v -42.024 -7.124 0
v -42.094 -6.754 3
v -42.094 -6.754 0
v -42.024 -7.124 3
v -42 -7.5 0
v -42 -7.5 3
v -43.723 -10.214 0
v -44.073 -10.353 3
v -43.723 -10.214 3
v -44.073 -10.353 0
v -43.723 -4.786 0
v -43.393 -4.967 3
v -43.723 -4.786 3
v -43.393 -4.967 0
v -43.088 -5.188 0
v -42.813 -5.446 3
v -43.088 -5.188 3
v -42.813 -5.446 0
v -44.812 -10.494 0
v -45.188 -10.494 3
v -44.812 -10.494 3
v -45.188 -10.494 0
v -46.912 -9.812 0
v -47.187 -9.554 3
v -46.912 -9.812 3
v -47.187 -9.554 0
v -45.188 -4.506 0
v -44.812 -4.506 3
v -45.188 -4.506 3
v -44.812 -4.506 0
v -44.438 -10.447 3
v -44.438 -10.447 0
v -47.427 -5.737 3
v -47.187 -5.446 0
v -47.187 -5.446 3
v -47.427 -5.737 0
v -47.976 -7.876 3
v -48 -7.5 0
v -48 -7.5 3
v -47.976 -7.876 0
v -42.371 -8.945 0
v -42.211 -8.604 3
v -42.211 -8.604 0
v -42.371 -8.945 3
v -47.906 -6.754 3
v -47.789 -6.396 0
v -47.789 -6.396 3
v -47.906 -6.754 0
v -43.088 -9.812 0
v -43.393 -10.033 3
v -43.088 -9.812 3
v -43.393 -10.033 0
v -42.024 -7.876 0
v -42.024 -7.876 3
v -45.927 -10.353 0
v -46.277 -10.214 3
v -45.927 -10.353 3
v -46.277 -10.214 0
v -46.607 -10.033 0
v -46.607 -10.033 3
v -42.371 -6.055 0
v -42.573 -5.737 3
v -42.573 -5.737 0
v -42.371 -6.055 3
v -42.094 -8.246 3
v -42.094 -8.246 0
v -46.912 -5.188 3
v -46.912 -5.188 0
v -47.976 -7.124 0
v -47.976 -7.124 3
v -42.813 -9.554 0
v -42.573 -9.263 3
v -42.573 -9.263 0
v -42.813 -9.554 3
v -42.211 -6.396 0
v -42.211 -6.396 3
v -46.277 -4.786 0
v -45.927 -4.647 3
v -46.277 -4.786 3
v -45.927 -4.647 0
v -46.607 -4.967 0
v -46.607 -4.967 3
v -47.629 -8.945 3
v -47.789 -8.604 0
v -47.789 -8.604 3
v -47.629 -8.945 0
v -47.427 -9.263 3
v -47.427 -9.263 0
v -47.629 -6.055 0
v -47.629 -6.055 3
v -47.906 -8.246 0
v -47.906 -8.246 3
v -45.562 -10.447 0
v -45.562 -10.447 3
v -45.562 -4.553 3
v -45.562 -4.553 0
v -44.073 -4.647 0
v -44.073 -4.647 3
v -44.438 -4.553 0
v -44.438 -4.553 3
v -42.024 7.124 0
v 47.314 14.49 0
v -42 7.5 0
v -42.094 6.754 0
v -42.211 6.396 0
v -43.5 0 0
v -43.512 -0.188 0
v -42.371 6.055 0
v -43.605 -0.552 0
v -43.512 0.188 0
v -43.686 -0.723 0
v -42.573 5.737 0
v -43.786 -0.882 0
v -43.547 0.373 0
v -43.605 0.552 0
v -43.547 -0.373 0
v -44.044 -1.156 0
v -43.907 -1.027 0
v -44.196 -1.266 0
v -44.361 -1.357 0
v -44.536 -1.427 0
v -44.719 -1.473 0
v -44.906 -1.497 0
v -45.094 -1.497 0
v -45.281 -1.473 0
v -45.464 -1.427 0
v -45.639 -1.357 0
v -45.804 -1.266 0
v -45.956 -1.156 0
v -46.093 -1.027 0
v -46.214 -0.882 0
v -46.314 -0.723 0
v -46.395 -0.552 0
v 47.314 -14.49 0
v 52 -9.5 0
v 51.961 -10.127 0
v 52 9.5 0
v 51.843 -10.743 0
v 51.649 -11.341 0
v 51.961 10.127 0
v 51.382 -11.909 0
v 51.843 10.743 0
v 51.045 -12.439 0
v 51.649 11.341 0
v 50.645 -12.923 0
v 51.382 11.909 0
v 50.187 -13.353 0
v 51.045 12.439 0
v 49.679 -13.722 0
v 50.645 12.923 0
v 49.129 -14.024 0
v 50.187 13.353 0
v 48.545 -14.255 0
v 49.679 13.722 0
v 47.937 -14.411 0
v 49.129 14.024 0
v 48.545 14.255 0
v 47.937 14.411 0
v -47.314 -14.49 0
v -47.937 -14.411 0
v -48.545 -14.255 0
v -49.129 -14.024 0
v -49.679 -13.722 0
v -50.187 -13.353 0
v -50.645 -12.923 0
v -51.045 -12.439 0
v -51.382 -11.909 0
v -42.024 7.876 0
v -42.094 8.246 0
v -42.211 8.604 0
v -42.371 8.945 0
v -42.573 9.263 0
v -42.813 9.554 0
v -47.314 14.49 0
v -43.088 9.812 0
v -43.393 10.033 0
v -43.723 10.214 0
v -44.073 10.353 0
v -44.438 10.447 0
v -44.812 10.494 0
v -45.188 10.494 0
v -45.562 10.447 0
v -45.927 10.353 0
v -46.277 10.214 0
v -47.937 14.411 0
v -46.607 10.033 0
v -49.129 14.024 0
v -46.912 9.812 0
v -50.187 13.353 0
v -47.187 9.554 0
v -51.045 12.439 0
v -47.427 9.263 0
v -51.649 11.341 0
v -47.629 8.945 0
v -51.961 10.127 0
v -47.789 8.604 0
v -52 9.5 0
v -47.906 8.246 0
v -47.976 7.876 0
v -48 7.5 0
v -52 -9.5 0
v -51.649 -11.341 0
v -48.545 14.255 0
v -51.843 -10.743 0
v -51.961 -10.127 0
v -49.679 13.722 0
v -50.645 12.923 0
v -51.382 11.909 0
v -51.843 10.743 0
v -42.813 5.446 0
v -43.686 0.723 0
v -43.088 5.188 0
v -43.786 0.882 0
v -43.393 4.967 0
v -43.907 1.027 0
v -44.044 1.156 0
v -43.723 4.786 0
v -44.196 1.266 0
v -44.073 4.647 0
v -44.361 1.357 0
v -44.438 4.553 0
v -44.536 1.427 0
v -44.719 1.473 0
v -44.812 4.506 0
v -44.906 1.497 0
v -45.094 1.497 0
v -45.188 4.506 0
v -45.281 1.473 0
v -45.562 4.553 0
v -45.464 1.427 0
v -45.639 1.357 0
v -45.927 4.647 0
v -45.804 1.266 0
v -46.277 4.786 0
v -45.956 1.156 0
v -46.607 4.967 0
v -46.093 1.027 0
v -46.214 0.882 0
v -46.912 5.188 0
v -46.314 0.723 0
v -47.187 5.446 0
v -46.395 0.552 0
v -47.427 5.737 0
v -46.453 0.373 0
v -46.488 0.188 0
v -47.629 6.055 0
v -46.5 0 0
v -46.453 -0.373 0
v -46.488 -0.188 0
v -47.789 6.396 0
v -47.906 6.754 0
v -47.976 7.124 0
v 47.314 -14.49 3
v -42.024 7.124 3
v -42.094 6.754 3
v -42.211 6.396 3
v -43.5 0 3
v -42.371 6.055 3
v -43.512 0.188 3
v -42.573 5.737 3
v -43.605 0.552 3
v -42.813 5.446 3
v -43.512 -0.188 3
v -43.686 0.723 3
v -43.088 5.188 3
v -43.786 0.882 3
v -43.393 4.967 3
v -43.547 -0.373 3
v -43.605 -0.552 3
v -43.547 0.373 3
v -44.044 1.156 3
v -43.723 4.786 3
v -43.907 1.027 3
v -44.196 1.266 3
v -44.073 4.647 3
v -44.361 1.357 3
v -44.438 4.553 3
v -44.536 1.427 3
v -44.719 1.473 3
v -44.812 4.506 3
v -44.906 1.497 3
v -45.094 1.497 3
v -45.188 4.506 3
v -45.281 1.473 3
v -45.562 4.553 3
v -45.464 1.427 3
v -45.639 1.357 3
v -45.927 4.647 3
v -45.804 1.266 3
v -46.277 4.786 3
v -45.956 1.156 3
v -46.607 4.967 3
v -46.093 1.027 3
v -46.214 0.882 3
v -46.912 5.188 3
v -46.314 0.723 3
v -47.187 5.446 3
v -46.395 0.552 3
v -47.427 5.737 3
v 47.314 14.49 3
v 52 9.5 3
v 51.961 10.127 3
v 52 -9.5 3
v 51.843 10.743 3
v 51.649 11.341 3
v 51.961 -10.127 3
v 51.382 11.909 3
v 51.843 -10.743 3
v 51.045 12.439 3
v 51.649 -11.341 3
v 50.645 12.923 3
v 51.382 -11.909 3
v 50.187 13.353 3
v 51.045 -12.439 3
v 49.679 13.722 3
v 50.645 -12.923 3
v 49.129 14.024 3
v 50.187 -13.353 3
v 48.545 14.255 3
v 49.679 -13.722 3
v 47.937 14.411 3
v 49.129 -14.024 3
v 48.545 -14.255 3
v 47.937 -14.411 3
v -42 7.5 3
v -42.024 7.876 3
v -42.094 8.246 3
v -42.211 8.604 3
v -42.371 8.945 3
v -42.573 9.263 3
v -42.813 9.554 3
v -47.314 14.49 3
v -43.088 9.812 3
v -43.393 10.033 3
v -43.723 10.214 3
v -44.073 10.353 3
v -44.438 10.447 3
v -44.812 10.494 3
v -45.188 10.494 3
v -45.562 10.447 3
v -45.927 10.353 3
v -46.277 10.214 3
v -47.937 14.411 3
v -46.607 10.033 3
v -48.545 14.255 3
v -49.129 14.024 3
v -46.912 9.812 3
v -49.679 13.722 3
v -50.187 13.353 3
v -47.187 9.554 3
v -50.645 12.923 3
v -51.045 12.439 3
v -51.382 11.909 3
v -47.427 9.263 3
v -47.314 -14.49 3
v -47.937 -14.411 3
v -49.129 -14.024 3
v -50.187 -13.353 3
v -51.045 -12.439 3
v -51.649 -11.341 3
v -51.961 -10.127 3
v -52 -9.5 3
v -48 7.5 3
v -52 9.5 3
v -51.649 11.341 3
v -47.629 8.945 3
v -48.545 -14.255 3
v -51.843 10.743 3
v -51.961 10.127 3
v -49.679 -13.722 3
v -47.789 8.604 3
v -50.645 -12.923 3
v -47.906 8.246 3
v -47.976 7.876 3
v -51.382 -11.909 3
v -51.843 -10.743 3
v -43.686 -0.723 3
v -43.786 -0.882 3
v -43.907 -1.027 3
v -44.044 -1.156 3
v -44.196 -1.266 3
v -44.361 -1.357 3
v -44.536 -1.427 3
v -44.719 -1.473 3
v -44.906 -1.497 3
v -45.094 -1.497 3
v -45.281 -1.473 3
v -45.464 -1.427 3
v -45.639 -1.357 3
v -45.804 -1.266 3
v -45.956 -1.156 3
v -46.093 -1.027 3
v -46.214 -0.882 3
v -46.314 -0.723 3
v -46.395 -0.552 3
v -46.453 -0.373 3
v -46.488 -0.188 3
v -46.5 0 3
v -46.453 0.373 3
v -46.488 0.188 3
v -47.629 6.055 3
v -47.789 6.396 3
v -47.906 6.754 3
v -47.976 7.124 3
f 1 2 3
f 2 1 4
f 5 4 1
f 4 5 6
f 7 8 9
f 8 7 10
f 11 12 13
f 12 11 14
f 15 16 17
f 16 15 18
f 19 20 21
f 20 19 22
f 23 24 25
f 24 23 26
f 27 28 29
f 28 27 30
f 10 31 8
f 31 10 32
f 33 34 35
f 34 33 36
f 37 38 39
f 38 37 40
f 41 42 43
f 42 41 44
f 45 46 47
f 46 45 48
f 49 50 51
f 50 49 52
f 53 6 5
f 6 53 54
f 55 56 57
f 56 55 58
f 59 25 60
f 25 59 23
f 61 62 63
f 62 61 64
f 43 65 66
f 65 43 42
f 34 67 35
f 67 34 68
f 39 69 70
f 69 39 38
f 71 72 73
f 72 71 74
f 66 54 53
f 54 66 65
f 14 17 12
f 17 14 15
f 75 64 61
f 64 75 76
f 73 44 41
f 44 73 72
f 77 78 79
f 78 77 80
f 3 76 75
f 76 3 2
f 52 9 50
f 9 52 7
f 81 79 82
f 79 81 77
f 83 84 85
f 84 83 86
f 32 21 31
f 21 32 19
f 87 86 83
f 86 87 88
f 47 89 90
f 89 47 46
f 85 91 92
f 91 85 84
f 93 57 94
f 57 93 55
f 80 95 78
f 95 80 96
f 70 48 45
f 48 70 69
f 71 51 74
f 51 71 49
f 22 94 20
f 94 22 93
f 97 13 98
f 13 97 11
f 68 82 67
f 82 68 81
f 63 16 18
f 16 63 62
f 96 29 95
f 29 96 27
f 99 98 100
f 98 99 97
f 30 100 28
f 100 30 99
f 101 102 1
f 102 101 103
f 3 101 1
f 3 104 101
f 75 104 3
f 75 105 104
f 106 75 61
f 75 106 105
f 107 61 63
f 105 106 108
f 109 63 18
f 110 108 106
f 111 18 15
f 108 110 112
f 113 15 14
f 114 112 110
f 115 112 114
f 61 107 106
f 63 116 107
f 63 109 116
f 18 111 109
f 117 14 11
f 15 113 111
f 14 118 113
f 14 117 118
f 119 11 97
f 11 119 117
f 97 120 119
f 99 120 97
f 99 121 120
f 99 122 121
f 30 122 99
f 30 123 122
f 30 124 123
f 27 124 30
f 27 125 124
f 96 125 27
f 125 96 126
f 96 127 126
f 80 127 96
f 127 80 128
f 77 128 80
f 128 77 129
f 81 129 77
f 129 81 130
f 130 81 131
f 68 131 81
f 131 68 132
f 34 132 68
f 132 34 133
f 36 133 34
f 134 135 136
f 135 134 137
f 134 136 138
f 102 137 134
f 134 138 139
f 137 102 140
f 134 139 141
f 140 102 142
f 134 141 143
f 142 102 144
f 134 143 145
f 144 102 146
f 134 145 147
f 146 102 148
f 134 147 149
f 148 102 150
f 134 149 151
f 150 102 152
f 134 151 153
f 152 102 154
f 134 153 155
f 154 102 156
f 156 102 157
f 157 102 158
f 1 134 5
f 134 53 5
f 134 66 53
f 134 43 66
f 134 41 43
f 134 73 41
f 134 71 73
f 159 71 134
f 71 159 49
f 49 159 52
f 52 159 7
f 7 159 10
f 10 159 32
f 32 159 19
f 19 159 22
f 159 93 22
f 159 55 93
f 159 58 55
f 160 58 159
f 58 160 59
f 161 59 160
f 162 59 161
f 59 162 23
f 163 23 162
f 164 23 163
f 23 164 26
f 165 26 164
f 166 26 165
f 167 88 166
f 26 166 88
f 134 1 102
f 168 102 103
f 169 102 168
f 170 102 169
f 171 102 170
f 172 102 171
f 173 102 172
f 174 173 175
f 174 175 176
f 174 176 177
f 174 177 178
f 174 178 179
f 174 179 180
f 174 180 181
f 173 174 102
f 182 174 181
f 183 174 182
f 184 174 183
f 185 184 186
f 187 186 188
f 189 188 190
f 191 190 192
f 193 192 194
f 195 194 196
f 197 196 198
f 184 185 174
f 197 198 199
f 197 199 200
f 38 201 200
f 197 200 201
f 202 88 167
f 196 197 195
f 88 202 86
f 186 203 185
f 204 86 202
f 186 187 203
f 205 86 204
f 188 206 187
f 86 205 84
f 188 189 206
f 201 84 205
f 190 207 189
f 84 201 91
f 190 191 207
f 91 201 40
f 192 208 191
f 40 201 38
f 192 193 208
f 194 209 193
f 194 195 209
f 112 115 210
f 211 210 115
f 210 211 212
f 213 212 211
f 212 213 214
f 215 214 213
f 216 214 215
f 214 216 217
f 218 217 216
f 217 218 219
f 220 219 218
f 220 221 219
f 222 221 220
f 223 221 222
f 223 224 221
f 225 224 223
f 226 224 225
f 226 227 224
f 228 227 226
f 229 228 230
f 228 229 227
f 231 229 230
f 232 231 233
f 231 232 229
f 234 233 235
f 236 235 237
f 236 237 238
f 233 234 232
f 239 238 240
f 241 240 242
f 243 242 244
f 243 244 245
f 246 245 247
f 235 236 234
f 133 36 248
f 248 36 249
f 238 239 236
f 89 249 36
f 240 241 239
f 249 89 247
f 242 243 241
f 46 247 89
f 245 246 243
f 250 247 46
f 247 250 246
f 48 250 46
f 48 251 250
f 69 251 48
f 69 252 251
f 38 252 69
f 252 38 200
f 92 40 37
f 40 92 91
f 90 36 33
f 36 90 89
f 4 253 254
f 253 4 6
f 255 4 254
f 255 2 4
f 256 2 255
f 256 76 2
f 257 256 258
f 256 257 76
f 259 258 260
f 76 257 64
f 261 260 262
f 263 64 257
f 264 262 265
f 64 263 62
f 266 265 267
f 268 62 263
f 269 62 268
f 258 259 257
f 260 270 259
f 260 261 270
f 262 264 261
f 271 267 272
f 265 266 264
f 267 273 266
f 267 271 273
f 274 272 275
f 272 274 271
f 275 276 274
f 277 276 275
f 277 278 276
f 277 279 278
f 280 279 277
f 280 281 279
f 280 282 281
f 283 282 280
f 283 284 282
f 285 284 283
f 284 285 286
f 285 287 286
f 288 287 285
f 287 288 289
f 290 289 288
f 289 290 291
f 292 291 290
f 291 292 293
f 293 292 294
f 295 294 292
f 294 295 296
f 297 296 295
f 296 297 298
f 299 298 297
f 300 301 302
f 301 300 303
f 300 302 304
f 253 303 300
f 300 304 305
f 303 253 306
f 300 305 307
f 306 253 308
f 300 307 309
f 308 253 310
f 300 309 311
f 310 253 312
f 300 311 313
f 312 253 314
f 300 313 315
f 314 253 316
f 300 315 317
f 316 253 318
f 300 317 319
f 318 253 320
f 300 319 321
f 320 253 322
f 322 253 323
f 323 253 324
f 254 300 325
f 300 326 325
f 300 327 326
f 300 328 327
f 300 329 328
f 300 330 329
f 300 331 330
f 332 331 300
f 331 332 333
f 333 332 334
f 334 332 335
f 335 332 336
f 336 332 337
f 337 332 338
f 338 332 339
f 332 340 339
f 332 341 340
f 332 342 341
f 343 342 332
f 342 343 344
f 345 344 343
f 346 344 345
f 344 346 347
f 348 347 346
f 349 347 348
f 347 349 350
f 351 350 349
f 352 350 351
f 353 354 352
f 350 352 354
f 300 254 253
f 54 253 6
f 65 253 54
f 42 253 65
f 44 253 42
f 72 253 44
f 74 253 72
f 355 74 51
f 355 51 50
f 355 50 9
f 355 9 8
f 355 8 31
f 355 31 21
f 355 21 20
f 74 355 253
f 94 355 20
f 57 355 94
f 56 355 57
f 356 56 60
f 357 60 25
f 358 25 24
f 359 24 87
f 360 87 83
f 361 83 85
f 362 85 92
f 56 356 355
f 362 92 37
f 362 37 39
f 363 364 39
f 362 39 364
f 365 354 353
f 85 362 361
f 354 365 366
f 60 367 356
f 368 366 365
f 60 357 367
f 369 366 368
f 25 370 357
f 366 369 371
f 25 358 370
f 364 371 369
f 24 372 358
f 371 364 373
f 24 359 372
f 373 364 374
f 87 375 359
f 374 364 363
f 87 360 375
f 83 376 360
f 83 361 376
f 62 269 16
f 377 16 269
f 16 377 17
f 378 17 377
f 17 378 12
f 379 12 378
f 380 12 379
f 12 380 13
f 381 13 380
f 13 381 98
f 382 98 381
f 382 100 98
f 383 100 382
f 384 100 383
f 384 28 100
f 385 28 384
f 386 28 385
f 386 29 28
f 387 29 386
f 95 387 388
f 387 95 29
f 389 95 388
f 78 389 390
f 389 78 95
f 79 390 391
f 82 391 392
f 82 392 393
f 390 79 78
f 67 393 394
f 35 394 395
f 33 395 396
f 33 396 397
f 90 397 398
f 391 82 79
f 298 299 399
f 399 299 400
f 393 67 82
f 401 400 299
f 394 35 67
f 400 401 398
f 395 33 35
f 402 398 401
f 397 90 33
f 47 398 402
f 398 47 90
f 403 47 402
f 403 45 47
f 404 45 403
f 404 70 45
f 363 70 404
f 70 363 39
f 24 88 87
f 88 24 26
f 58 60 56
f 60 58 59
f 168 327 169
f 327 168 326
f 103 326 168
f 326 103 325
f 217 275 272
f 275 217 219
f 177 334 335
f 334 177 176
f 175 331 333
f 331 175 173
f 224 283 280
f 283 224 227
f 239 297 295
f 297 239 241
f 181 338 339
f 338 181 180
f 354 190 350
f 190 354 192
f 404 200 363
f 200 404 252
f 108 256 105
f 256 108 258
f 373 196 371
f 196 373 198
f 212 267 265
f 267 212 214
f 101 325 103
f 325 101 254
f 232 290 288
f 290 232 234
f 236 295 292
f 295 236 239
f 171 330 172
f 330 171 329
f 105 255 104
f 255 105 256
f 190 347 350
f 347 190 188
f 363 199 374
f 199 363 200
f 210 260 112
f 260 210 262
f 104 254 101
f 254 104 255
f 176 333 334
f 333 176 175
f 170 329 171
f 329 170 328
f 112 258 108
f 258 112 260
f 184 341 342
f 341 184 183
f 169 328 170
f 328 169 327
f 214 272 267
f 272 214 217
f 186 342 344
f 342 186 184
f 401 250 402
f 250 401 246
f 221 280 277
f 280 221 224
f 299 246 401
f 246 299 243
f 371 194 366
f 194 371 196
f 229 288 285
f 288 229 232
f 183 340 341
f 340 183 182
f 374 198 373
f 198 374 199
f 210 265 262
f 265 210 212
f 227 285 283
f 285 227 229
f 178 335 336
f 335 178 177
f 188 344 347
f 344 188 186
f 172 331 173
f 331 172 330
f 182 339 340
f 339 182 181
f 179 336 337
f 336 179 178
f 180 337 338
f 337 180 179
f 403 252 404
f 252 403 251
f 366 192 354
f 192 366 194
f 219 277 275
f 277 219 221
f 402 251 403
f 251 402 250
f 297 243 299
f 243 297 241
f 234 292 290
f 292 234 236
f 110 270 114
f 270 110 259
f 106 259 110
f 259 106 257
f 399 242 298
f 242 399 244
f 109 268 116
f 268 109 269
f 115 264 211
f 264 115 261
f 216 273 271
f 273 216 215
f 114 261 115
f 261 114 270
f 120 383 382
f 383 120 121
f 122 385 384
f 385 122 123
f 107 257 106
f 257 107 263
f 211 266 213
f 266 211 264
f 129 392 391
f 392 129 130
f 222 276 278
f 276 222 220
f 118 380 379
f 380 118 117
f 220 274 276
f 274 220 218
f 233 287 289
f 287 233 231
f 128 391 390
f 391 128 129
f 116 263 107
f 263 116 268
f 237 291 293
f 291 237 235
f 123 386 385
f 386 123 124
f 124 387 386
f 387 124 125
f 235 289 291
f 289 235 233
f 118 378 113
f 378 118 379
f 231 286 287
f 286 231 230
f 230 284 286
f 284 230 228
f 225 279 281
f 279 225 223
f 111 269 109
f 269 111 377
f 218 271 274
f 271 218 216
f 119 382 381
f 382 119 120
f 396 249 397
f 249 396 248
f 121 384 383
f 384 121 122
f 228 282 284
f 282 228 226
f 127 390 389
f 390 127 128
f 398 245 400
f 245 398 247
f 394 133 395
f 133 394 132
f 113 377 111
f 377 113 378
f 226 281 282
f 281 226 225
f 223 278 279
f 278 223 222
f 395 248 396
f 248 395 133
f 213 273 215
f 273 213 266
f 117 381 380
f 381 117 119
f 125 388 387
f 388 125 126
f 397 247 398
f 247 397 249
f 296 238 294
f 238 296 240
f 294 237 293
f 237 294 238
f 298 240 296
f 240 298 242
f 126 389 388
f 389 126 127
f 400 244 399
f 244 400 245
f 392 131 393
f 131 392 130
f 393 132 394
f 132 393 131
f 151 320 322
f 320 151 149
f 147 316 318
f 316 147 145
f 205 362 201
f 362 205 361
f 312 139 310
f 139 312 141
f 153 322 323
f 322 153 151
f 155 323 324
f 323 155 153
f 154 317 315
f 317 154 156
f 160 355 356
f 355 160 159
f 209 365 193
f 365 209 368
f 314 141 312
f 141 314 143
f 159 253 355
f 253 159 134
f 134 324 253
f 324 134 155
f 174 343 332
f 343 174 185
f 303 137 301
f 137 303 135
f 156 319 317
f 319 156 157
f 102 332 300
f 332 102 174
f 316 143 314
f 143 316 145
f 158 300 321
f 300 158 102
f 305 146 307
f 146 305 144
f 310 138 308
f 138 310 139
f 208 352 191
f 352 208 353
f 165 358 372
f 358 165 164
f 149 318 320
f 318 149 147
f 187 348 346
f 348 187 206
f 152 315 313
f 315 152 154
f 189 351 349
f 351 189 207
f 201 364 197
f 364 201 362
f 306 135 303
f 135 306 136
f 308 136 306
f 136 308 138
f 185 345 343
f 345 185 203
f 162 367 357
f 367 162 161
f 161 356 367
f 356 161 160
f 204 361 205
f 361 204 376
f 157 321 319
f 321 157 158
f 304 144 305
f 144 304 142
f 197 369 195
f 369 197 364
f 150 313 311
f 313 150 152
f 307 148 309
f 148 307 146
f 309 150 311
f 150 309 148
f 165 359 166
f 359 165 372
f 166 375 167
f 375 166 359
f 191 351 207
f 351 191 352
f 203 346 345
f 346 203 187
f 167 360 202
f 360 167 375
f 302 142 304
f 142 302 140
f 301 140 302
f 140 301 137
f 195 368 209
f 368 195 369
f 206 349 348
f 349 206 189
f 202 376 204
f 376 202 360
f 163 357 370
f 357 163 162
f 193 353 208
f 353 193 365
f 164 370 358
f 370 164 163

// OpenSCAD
$fn = 50;


difference() {
	union() {
		hull() {
			translate(v = [-47.0000000000, 9.5000000000, 0]) {
				cylinder(h = 3, r = 5);
			}
			translate(v = [47.0000000000, 9.5000000000, 0]) {
				cylinder(h = 3, r = 5);
			}
			translate(v = [-47.0000000000, -9.5000000000, 0]) {
				cylinder(h = 3, r = 5);
			}
			translate(v = [47.0000000000, -9.5000000000, 0]) {
				cylinder(h = 3, r = 5);
			}
		}
	}
	union() {
		translate(v = [-45.0000000000, -7.5000000000, 0]) {
			cylinder(h = 3, r = 3.0000000000);
		}
		translate(v = [-45.0000000000, 7.5000000000, 0]) {
			cylinder(h = 3, r = 3.0000000000);
		}
		translate(v = [-45.0000000000, -7.5000000000, 0]) {
			cylinder(h = 3, r = 1.5000000000);
		}
		translate(v = [-45.0000000000, 0.0000000000, 0]) {
			cylinder(h = 3, r = 1.5000000000);
		}
		translate(v = [-45.0000000000, 7.5000000000, 0]) {
			cylinder(h = 3, r = 1.5000000000);
		}
		translate(v = [-45.0000000000, -7.5000000000, 0]) {
			cylinder(h = 3, r = 1.5000000000);
		}
		translate(v = [-45.0000000000, 0.0000000000, 0]) {
			cylinder(h = 3, r = 1.5000000000);
		}
		translate(v = [-45.0000000000, 7.5000000000, 0]) {
			cylinder(h = 3, r = 1.5000000000);
		}
		translate(v = [-45.0000000000, -7.5000000000, 0]) {
			cylinder(h = 3, r = 1.5000000000);
		}
		translate(v = [-45.0000000000, 0.0000000000, 0]) {
			cylinder(h = 3, r = 1.5000000000);
		}
		translate(v = [-45.0000000000, 7.5000000000, 0]) {
			cylinder(h = 3, r = 1.5000000000);
		}
	}
}
